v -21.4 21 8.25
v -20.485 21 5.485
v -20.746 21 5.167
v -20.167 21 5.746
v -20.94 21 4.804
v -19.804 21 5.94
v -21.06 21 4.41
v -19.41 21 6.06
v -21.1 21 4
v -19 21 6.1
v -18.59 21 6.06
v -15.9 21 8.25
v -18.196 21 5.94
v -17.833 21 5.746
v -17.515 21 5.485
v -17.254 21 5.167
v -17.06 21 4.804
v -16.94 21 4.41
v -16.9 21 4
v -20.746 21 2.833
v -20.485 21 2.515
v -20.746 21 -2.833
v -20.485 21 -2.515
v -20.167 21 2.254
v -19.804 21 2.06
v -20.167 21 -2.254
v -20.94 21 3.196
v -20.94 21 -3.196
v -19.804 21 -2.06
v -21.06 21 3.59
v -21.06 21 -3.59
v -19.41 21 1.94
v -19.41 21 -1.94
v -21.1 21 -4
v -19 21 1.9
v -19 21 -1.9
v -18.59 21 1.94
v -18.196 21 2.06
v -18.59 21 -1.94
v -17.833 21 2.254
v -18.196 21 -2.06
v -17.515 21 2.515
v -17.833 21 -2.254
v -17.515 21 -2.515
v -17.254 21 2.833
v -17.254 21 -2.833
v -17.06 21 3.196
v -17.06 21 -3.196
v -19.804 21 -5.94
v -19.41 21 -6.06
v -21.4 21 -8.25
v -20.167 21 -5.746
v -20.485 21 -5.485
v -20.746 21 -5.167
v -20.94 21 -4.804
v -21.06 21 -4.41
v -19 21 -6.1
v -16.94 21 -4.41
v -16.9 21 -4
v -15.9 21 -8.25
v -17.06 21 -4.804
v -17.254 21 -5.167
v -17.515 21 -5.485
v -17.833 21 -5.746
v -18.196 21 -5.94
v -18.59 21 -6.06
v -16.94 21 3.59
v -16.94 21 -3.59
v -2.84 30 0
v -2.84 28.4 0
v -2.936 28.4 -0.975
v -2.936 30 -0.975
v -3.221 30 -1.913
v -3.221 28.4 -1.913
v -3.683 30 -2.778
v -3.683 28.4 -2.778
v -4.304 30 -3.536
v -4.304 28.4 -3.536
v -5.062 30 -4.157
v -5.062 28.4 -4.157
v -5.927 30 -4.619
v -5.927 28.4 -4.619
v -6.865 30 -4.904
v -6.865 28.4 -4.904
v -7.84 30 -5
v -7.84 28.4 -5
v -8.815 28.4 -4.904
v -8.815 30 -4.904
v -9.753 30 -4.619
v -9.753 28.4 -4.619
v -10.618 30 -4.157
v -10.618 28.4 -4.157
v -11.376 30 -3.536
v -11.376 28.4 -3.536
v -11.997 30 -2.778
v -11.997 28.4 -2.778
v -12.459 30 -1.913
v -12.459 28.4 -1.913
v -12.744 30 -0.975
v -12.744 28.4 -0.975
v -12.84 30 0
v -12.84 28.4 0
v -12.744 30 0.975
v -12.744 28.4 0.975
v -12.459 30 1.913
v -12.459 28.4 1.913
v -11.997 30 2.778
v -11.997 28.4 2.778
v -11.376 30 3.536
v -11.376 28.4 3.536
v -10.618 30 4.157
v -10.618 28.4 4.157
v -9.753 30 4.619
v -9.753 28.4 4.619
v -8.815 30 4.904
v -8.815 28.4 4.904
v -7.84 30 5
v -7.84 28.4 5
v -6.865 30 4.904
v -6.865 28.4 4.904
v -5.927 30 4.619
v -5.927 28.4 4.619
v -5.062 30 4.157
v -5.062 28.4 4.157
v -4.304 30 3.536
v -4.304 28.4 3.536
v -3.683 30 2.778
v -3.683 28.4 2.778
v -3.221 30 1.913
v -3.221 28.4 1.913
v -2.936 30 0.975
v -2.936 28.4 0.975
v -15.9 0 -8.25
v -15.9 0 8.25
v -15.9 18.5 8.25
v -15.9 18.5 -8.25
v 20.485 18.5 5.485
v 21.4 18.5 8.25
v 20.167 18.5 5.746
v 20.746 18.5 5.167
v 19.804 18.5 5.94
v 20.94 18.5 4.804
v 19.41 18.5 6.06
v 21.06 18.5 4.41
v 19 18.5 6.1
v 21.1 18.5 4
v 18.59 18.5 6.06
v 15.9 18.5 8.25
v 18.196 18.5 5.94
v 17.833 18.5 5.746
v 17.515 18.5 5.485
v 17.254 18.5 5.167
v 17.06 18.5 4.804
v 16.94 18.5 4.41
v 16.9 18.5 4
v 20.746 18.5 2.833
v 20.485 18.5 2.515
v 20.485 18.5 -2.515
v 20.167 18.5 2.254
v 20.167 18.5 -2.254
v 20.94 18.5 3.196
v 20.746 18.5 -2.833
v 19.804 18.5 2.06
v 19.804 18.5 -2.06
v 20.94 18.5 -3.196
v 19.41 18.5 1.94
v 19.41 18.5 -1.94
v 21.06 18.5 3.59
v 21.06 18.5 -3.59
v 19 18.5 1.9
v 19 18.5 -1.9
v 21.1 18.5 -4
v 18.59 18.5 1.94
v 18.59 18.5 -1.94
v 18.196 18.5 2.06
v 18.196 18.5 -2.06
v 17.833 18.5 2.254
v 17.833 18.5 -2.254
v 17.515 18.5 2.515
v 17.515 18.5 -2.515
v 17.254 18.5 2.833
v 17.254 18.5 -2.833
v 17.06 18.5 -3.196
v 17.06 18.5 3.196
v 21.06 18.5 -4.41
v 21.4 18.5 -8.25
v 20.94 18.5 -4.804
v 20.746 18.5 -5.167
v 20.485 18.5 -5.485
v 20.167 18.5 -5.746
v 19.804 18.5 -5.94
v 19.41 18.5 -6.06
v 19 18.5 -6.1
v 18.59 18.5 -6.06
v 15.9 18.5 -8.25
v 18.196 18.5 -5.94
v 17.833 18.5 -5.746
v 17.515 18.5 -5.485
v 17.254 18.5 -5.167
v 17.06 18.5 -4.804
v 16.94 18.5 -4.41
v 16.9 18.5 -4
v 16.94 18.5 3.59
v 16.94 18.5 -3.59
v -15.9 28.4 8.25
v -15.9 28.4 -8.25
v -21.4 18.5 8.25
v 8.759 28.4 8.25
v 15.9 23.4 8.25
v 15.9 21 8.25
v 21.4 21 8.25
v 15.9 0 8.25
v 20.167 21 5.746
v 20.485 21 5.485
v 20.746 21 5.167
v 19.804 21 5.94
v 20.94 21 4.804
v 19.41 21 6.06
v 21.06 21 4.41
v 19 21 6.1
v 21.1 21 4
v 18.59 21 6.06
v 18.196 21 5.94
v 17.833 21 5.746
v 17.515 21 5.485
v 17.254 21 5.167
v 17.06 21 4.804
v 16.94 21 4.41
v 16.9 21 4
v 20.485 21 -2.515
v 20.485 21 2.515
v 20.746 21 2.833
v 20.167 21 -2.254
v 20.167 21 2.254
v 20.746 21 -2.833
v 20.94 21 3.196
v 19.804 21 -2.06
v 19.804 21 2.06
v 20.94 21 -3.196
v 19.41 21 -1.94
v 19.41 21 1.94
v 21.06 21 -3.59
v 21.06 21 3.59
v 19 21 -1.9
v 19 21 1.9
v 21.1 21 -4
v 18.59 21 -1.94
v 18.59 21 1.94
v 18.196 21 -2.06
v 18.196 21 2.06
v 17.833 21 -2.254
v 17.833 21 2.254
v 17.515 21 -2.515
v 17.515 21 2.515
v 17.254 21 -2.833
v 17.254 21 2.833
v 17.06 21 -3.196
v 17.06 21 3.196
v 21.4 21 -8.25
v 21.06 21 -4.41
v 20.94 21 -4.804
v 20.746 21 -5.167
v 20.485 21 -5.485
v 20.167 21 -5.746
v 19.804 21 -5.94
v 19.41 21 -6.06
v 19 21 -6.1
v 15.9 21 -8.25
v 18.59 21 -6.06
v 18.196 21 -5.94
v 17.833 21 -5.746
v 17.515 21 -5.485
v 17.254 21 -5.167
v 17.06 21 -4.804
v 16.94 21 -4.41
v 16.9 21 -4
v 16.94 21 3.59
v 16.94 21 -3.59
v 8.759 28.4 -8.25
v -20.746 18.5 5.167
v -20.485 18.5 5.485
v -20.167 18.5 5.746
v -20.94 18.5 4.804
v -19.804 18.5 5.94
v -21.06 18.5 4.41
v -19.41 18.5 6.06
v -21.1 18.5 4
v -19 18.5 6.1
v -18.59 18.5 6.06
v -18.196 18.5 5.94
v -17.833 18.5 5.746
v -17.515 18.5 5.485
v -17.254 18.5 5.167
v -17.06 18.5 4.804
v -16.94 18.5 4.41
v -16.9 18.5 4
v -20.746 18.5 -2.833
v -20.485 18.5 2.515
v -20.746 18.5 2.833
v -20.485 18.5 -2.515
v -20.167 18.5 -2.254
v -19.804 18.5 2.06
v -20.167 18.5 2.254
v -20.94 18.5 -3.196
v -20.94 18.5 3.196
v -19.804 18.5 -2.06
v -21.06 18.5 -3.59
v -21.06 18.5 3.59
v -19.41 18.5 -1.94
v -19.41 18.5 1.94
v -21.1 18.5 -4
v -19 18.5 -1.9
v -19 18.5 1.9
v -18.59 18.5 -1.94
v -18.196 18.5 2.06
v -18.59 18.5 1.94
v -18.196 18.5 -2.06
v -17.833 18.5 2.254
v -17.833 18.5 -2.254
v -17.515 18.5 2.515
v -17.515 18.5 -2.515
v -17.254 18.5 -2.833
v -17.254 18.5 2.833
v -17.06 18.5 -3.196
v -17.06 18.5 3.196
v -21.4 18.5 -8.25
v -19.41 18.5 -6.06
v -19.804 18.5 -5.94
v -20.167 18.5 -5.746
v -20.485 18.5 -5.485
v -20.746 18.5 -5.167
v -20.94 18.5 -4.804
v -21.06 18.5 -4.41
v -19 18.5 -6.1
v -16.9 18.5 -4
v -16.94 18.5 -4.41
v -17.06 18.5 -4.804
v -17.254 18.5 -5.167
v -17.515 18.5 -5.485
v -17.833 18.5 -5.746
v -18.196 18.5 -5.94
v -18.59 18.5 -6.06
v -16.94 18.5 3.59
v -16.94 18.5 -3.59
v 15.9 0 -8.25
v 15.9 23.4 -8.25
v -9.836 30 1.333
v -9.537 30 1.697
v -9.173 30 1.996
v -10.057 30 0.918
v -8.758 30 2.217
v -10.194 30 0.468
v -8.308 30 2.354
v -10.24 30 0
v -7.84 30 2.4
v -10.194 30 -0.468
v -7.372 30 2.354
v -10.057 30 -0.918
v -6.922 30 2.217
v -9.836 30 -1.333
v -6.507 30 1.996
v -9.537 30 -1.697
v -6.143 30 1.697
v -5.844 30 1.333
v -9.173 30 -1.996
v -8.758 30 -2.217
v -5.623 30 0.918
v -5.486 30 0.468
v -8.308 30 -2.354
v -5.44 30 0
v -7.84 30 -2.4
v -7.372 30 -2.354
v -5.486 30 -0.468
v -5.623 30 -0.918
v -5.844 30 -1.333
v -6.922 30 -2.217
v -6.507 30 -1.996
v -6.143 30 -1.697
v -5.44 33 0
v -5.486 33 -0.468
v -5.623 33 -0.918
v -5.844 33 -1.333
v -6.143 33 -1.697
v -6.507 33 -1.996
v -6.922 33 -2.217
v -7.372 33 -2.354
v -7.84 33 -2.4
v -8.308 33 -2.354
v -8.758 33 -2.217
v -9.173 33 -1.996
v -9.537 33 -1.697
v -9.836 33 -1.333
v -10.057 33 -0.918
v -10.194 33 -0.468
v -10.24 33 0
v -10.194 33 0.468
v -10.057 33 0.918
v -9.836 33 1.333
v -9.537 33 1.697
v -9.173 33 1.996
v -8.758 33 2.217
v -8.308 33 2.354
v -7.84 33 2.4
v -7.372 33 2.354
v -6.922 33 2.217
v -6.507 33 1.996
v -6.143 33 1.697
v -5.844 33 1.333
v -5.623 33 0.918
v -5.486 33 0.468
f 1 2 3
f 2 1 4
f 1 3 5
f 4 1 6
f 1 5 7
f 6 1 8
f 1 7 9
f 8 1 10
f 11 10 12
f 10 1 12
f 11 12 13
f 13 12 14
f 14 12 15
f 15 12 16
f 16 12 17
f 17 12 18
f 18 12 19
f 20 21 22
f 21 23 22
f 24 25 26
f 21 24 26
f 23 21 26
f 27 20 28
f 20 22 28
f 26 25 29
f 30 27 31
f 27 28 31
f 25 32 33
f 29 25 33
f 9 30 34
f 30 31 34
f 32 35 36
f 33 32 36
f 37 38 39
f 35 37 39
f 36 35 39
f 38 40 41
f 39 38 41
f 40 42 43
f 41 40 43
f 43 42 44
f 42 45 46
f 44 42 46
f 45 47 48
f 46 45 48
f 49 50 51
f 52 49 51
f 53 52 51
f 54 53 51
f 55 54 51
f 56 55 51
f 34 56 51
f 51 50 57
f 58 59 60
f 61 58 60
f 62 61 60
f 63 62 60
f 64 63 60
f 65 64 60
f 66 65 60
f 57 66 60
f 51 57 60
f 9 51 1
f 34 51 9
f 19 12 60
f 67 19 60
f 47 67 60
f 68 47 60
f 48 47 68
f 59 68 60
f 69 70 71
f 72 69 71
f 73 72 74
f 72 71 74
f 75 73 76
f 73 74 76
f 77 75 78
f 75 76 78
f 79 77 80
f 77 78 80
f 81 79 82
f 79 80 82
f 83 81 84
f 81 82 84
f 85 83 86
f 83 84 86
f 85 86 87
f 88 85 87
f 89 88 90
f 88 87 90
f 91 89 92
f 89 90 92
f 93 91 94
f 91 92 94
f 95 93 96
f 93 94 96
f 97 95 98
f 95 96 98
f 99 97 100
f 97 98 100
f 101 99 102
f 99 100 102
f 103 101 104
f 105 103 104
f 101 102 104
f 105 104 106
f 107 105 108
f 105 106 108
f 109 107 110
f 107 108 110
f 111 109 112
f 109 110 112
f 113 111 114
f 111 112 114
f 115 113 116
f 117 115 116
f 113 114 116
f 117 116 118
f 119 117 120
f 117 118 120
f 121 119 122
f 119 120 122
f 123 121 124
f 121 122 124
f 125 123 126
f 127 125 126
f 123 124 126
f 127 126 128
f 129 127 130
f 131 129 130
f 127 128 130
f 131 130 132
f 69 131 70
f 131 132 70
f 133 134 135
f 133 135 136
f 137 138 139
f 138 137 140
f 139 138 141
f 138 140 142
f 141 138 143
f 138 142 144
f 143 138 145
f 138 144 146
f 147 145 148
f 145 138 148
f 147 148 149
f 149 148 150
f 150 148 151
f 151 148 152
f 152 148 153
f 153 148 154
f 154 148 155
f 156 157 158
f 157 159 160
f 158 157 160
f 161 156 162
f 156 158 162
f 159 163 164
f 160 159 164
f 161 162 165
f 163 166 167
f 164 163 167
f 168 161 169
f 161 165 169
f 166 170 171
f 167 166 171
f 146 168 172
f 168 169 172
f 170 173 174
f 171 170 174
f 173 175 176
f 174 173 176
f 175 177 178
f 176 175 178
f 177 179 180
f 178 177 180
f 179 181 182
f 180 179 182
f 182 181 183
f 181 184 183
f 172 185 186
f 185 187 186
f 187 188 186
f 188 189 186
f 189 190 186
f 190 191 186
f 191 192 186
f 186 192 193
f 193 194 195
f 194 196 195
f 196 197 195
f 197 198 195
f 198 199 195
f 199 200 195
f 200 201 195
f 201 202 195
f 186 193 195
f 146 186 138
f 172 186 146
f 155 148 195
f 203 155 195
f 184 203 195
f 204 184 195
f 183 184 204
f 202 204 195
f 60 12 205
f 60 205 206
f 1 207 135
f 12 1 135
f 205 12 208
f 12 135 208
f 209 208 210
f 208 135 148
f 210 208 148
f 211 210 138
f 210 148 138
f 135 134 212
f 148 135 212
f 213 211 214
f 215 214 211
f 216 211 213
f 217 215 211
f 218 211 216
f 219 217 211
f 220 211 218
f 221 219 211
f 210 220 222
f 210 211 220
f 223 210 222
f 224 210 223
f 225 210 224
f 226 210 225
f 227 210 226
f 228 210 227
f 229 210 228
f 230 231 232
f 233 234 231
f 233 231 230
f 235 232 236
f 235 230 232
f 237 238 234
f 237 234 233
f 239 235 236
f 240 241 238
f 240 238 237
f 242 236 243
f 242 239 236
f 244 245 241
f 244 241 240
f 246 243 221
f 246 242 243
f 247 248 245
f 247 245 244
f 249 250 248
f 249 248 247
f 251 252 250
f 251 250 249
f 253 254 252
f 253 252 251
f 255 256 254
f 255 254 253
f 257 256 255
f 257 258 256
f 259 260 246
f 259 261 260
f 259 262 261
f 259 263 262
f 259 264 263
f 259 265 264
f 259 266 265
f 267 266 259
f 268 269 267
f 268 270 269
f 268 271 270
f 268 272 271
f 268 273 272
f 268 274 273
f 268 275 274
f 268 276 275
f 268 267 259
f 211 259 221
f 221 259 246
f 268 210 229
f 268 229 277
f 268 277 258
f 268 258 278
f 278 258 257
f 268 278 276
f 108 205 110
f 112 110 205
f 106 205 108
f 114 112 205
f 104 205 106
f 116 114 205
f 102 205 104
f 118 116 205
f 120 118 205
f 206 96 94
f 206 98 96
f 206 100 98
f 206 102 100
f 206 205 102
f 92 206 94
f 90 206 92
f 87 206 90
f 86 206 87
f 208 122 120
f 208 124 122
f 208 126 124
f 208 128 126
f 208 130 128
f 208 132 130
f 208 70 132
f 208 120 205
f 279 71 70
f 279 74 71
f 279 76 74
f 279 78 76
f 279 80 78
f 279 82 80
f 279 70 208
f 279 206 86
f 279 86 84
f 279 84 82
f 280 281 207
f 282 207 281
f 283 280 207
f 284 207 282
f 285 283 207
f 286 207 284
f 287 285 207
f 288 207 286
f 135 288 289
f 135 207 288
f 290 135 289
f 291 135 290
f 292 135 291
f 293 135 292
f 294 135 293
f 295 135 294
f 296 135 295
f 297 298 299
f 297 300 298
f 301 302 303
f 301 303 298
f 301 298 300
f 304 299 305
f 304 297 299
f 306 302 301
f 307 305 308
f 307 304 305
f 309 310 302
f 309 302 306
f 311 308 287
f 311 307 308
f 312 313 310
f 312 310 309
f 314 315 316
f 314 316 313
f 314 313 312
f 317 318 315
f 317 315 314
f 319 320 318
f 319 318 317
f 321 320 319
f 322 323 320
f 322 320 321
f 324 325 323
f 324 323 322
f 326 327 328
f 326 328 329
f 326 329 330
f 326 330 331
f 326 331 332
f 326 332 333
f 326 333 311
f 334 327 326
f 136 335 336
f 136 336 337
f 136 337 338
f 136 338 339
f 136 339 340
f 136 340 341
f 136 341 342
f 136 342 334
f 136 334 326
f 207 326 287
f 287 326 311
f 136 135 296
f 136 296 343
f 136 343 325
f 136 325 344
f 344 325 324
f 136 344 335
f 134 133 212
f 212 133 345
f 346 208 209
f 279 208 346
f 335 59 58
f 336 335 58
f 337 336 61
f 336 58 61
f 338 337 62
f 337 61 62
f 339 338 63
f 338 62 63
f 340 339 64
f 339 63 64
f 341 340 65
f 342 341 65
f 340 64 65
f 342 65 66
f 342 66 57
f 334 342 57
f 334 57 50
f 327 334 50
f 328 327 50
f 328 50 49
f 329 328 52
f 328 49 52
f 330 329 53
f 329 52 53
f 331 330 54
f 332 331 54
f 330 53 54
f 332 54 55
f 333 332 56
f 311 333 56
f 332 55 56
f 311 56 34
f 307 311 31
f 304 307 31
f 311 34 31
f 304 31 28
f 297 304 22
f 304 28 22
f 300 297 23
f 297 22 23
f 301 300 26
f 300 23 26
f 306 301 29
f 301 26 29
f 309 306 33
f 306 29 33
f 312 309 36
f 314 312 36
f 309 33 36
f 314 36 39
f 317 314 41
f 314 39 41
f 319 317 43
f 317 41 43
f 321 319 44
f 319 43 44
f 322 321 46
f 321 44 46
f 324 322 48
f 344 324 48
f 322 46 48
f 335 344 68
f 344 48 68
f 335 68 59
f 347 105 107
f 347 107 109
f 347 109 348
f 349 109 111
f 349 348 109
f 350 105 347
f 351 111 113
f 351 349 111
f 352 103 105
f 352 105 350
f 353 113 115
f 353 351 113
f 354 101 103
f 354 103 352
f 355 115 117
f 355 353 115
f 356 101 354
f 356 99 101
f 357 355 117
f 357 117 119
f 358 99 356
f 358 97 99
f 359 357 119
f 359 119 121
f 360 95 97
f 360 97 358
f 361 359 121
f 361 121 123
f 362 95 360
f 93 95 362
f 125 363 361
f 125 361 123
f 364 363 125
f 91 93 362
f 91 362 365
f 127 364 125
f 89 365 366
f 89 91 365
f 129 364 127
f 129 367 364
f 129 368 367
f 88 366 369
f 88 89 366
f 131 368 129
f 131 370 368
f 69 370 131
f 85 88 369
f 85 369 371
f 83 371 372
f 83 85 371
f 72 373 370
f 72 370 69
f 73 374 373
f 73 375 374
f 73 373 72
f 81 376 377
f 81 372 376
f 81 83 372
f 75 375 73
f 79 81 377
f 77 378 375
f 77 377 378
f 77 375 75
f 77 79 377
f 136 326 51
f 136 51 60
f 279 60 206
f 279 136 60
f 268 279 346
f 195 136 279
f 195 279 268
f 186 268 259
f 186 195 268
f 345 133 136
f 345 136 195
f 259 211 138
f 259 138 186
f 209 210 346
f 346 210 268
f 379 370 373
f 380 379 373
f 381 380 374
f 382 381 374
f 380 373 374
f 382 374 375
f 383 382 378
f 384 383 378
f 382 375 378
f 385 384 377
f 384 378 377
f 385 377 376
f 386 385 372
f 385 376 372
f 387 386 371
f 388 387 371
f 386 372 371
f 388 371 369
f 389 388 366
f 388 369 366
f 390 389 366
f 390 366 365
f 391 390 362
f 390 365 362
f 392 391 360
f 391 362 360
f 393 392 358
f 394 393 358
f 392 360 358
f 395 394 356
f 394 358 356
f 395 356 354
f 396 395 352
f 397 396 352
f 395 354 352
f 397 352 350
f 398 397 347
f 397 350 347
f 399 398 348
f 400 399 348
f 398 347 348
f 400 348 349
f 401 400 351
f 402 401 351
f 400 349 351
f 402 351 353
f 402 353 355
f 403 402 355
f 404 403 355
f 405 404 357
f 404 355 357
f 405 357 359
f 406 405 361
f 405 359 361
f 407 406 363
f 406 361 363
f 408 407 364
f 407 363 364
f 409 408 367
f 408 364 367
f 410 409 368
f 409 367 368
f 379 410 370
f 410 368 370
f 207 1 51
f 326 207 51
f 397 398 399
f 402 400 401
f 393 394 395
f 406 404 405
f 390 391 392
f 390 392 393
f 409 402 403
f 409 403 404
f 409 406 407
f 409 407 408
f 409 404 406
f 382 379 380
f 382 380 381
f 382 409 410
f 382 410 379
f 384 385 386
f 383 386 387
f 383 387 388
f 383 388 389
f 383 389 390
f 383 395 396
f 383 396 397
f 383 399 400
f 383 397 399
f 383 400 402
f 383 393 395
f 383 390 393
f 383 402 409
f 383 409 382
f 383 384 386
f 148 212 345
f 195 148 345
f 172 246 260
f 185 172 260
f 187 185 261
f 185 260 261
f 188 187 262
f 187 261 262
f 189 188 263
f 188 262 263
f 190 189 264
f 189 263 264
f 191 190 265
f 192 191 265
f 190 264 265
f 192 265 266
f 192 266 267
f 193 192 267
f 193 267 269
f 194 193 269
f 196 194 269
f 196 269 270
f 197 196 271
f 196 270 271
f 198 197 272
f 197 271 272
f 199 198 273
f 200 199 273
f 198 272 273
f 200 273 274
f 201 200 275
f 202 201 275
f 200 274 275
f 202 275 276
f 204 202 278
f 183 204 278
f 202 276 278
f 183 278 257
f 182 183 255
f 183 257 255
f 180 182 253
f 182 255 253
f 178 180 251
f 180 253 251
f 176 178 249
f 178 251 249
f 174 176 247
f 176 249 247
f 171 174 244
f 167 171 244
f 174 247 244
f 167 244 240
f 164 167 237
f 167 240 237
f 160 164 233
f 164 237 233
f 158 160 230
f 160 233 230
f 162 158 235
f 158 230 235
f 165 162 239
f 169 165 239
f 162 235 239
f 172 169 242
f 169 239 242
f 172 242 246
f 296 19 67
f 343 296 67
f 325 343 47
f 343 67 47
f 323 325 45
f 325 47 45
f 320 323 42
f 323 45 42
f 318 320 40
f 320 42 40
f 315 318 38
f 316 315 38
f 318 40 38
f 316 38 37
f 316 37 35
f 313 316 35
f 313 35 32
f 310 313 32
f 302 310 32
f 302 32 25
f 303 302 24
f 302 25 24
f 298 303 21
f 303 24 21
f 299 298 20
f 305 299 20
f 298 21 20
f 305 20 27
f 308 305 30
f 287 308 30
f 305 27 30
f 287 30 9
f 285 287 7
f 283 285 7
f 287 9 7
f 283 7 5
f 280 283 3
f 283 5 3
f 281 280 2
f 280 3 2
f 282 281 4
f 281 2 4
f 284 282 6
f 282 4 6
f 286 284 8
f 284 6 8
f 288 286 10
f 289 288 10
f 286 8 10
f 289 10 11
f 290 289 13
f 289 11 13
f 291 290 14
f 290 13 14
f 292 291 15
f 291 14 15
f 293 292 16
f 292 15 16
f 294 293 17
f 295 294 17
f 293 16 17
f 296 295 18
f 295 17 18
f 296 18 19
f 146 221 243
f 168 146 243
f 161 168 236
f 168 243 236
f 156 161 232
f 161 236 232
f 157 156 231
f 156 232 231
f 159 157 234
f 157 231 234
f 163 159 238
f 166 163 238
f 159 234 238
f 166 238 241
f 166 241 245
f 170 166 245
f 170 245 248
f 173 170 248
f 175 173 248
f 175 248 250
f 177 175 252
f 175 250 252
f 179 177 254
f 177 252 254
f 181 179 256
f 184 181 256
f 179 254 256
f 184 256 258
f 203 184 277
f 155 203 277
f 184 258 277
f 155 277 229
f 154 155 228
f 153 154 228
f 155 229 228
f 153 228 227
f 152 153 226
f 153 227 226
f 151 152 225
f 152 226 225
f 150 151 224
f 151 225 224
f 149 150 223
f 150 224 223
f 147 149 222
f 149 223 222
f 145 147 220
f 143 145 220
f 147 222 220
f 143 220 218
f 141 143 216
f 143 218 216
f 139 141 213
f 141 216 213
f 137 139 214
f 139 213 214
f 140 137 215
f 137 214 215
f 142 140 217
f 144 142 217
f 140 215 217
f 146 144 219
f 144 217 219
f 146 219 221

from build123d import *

# Parameters (mm, degrees)
SKETCH1_W           = 31.8
SKETCH1_H           = 16.5
BOSS_EXTRUDE1_DEPTH = 28.4
SKETCH2_W           = 16.5
SKETCH2_H           = 2.5
BOSS_EXTRUDE2_DEPTH = 5.5
SKETCH3_R           = 2.1
CUT_EXTRUDE1_DEPTH  = 2.5
SKETCH4_R           = 5
BOSS_EXTRUDE3_DEPTH = 1.6
SKETCH5_R           = 2.4
BOSS_EXTRUDE4_DEPTH = 3
CHAMFER1_SIZE       = 5
CHAMFER1_SIZE2      = 7.140740034


with BuildPart() as part:
    # Sketch1 → Boss-Extrude1 (new body)
    with BuildSketch(Plane(origin=(0, 0, 0), x_dir=(1, 0, 0), z_dir=(0, 1, 0))):
        Rectangle(SKETCH1_W, SKETCH1_H)
    extrude(amount=BOSS_EXTRUDE1_DEPTH)

    # Sketch2 → Boss-Extrude2 (add)
    with BuildSketch(Plane(origin=(15.9, 0, 0), x_dir=(0, 0, -1), z_dir=(1, 0, 0))):
        with Locations((0, 19.75)):
            Rectangle(SKETCH2_W, SKETCH2_H)
    boss_extrude2 = extrude(amount=BOSS_EXTRUDE2_DEPTH)

    # Mirror1: Boss-Extrude2 across plane
    add(boss_extrude2.mirror(Plane(origin=(0, 0, 0), x_dir=(0, 0, 1), z_dir=(1, 0, 0))))

    # Sketch3 → Cut-Extrude1 (cut)
    with BuildSketch(Plane(origin=(0, 21, 0), x_dir=(1, 0, 0), z_dir=(0, 1, 0))):
        with Locations((-19, 4)):
            Circle(SKETCH3_R)
        with Locations((-19, -4)):
            Circle(SKETCH3_R)
        with Locations((19, 4)):
            Circle(SKETCH3_R)
        with Locations((19, -4)):
            Circle(SKETCH3_R)
    extrude(amount=-CUT_EXTRUDE1_DEPTH, mode=Mode.SUBTRACT)

    # Sketch4 → Boss-Extrude3 (add)
    with BuildSketch(Plane(origin=(0, 28.4, 0), x_dir=(1, 0, 0), z_dir=(0, 1, 0))):
        with Locations((-7.84, 0)):
            Circle(SKETCH4_R)
    extrude(amount=BOSS_EXTRUDE3_DEPTH)

    # Sketch5 → Boss-Extrude4 (add)
    with BuildSketch(Plane(origin=(0, 30, 0), x_dir=(1, 0, 0), z_dir=(0, 1, 0))):
        with Locations((-7.84, 0)):
            Circle(SKETCH5_R)
    extrude(amount=BOSS_EXTRUDE4_DEPTH)

    # Chamfer1
    chamfer1_edges = [part.edges().sort_by_distance(p)[0] for p in [
        (15.9, 28.4, 0),
    ]]
    chamfer1_side = [part.faces().sort_by_distance(p)[0] for p in [
        (15.9, 24.7, 0),
    ]]
    chamfer(chamfer1_edges, length=CHAMFER1_SIZE, length2=CHAMFER1_SIZE2, reference=chamfer1_side[0])


solid = part.part
